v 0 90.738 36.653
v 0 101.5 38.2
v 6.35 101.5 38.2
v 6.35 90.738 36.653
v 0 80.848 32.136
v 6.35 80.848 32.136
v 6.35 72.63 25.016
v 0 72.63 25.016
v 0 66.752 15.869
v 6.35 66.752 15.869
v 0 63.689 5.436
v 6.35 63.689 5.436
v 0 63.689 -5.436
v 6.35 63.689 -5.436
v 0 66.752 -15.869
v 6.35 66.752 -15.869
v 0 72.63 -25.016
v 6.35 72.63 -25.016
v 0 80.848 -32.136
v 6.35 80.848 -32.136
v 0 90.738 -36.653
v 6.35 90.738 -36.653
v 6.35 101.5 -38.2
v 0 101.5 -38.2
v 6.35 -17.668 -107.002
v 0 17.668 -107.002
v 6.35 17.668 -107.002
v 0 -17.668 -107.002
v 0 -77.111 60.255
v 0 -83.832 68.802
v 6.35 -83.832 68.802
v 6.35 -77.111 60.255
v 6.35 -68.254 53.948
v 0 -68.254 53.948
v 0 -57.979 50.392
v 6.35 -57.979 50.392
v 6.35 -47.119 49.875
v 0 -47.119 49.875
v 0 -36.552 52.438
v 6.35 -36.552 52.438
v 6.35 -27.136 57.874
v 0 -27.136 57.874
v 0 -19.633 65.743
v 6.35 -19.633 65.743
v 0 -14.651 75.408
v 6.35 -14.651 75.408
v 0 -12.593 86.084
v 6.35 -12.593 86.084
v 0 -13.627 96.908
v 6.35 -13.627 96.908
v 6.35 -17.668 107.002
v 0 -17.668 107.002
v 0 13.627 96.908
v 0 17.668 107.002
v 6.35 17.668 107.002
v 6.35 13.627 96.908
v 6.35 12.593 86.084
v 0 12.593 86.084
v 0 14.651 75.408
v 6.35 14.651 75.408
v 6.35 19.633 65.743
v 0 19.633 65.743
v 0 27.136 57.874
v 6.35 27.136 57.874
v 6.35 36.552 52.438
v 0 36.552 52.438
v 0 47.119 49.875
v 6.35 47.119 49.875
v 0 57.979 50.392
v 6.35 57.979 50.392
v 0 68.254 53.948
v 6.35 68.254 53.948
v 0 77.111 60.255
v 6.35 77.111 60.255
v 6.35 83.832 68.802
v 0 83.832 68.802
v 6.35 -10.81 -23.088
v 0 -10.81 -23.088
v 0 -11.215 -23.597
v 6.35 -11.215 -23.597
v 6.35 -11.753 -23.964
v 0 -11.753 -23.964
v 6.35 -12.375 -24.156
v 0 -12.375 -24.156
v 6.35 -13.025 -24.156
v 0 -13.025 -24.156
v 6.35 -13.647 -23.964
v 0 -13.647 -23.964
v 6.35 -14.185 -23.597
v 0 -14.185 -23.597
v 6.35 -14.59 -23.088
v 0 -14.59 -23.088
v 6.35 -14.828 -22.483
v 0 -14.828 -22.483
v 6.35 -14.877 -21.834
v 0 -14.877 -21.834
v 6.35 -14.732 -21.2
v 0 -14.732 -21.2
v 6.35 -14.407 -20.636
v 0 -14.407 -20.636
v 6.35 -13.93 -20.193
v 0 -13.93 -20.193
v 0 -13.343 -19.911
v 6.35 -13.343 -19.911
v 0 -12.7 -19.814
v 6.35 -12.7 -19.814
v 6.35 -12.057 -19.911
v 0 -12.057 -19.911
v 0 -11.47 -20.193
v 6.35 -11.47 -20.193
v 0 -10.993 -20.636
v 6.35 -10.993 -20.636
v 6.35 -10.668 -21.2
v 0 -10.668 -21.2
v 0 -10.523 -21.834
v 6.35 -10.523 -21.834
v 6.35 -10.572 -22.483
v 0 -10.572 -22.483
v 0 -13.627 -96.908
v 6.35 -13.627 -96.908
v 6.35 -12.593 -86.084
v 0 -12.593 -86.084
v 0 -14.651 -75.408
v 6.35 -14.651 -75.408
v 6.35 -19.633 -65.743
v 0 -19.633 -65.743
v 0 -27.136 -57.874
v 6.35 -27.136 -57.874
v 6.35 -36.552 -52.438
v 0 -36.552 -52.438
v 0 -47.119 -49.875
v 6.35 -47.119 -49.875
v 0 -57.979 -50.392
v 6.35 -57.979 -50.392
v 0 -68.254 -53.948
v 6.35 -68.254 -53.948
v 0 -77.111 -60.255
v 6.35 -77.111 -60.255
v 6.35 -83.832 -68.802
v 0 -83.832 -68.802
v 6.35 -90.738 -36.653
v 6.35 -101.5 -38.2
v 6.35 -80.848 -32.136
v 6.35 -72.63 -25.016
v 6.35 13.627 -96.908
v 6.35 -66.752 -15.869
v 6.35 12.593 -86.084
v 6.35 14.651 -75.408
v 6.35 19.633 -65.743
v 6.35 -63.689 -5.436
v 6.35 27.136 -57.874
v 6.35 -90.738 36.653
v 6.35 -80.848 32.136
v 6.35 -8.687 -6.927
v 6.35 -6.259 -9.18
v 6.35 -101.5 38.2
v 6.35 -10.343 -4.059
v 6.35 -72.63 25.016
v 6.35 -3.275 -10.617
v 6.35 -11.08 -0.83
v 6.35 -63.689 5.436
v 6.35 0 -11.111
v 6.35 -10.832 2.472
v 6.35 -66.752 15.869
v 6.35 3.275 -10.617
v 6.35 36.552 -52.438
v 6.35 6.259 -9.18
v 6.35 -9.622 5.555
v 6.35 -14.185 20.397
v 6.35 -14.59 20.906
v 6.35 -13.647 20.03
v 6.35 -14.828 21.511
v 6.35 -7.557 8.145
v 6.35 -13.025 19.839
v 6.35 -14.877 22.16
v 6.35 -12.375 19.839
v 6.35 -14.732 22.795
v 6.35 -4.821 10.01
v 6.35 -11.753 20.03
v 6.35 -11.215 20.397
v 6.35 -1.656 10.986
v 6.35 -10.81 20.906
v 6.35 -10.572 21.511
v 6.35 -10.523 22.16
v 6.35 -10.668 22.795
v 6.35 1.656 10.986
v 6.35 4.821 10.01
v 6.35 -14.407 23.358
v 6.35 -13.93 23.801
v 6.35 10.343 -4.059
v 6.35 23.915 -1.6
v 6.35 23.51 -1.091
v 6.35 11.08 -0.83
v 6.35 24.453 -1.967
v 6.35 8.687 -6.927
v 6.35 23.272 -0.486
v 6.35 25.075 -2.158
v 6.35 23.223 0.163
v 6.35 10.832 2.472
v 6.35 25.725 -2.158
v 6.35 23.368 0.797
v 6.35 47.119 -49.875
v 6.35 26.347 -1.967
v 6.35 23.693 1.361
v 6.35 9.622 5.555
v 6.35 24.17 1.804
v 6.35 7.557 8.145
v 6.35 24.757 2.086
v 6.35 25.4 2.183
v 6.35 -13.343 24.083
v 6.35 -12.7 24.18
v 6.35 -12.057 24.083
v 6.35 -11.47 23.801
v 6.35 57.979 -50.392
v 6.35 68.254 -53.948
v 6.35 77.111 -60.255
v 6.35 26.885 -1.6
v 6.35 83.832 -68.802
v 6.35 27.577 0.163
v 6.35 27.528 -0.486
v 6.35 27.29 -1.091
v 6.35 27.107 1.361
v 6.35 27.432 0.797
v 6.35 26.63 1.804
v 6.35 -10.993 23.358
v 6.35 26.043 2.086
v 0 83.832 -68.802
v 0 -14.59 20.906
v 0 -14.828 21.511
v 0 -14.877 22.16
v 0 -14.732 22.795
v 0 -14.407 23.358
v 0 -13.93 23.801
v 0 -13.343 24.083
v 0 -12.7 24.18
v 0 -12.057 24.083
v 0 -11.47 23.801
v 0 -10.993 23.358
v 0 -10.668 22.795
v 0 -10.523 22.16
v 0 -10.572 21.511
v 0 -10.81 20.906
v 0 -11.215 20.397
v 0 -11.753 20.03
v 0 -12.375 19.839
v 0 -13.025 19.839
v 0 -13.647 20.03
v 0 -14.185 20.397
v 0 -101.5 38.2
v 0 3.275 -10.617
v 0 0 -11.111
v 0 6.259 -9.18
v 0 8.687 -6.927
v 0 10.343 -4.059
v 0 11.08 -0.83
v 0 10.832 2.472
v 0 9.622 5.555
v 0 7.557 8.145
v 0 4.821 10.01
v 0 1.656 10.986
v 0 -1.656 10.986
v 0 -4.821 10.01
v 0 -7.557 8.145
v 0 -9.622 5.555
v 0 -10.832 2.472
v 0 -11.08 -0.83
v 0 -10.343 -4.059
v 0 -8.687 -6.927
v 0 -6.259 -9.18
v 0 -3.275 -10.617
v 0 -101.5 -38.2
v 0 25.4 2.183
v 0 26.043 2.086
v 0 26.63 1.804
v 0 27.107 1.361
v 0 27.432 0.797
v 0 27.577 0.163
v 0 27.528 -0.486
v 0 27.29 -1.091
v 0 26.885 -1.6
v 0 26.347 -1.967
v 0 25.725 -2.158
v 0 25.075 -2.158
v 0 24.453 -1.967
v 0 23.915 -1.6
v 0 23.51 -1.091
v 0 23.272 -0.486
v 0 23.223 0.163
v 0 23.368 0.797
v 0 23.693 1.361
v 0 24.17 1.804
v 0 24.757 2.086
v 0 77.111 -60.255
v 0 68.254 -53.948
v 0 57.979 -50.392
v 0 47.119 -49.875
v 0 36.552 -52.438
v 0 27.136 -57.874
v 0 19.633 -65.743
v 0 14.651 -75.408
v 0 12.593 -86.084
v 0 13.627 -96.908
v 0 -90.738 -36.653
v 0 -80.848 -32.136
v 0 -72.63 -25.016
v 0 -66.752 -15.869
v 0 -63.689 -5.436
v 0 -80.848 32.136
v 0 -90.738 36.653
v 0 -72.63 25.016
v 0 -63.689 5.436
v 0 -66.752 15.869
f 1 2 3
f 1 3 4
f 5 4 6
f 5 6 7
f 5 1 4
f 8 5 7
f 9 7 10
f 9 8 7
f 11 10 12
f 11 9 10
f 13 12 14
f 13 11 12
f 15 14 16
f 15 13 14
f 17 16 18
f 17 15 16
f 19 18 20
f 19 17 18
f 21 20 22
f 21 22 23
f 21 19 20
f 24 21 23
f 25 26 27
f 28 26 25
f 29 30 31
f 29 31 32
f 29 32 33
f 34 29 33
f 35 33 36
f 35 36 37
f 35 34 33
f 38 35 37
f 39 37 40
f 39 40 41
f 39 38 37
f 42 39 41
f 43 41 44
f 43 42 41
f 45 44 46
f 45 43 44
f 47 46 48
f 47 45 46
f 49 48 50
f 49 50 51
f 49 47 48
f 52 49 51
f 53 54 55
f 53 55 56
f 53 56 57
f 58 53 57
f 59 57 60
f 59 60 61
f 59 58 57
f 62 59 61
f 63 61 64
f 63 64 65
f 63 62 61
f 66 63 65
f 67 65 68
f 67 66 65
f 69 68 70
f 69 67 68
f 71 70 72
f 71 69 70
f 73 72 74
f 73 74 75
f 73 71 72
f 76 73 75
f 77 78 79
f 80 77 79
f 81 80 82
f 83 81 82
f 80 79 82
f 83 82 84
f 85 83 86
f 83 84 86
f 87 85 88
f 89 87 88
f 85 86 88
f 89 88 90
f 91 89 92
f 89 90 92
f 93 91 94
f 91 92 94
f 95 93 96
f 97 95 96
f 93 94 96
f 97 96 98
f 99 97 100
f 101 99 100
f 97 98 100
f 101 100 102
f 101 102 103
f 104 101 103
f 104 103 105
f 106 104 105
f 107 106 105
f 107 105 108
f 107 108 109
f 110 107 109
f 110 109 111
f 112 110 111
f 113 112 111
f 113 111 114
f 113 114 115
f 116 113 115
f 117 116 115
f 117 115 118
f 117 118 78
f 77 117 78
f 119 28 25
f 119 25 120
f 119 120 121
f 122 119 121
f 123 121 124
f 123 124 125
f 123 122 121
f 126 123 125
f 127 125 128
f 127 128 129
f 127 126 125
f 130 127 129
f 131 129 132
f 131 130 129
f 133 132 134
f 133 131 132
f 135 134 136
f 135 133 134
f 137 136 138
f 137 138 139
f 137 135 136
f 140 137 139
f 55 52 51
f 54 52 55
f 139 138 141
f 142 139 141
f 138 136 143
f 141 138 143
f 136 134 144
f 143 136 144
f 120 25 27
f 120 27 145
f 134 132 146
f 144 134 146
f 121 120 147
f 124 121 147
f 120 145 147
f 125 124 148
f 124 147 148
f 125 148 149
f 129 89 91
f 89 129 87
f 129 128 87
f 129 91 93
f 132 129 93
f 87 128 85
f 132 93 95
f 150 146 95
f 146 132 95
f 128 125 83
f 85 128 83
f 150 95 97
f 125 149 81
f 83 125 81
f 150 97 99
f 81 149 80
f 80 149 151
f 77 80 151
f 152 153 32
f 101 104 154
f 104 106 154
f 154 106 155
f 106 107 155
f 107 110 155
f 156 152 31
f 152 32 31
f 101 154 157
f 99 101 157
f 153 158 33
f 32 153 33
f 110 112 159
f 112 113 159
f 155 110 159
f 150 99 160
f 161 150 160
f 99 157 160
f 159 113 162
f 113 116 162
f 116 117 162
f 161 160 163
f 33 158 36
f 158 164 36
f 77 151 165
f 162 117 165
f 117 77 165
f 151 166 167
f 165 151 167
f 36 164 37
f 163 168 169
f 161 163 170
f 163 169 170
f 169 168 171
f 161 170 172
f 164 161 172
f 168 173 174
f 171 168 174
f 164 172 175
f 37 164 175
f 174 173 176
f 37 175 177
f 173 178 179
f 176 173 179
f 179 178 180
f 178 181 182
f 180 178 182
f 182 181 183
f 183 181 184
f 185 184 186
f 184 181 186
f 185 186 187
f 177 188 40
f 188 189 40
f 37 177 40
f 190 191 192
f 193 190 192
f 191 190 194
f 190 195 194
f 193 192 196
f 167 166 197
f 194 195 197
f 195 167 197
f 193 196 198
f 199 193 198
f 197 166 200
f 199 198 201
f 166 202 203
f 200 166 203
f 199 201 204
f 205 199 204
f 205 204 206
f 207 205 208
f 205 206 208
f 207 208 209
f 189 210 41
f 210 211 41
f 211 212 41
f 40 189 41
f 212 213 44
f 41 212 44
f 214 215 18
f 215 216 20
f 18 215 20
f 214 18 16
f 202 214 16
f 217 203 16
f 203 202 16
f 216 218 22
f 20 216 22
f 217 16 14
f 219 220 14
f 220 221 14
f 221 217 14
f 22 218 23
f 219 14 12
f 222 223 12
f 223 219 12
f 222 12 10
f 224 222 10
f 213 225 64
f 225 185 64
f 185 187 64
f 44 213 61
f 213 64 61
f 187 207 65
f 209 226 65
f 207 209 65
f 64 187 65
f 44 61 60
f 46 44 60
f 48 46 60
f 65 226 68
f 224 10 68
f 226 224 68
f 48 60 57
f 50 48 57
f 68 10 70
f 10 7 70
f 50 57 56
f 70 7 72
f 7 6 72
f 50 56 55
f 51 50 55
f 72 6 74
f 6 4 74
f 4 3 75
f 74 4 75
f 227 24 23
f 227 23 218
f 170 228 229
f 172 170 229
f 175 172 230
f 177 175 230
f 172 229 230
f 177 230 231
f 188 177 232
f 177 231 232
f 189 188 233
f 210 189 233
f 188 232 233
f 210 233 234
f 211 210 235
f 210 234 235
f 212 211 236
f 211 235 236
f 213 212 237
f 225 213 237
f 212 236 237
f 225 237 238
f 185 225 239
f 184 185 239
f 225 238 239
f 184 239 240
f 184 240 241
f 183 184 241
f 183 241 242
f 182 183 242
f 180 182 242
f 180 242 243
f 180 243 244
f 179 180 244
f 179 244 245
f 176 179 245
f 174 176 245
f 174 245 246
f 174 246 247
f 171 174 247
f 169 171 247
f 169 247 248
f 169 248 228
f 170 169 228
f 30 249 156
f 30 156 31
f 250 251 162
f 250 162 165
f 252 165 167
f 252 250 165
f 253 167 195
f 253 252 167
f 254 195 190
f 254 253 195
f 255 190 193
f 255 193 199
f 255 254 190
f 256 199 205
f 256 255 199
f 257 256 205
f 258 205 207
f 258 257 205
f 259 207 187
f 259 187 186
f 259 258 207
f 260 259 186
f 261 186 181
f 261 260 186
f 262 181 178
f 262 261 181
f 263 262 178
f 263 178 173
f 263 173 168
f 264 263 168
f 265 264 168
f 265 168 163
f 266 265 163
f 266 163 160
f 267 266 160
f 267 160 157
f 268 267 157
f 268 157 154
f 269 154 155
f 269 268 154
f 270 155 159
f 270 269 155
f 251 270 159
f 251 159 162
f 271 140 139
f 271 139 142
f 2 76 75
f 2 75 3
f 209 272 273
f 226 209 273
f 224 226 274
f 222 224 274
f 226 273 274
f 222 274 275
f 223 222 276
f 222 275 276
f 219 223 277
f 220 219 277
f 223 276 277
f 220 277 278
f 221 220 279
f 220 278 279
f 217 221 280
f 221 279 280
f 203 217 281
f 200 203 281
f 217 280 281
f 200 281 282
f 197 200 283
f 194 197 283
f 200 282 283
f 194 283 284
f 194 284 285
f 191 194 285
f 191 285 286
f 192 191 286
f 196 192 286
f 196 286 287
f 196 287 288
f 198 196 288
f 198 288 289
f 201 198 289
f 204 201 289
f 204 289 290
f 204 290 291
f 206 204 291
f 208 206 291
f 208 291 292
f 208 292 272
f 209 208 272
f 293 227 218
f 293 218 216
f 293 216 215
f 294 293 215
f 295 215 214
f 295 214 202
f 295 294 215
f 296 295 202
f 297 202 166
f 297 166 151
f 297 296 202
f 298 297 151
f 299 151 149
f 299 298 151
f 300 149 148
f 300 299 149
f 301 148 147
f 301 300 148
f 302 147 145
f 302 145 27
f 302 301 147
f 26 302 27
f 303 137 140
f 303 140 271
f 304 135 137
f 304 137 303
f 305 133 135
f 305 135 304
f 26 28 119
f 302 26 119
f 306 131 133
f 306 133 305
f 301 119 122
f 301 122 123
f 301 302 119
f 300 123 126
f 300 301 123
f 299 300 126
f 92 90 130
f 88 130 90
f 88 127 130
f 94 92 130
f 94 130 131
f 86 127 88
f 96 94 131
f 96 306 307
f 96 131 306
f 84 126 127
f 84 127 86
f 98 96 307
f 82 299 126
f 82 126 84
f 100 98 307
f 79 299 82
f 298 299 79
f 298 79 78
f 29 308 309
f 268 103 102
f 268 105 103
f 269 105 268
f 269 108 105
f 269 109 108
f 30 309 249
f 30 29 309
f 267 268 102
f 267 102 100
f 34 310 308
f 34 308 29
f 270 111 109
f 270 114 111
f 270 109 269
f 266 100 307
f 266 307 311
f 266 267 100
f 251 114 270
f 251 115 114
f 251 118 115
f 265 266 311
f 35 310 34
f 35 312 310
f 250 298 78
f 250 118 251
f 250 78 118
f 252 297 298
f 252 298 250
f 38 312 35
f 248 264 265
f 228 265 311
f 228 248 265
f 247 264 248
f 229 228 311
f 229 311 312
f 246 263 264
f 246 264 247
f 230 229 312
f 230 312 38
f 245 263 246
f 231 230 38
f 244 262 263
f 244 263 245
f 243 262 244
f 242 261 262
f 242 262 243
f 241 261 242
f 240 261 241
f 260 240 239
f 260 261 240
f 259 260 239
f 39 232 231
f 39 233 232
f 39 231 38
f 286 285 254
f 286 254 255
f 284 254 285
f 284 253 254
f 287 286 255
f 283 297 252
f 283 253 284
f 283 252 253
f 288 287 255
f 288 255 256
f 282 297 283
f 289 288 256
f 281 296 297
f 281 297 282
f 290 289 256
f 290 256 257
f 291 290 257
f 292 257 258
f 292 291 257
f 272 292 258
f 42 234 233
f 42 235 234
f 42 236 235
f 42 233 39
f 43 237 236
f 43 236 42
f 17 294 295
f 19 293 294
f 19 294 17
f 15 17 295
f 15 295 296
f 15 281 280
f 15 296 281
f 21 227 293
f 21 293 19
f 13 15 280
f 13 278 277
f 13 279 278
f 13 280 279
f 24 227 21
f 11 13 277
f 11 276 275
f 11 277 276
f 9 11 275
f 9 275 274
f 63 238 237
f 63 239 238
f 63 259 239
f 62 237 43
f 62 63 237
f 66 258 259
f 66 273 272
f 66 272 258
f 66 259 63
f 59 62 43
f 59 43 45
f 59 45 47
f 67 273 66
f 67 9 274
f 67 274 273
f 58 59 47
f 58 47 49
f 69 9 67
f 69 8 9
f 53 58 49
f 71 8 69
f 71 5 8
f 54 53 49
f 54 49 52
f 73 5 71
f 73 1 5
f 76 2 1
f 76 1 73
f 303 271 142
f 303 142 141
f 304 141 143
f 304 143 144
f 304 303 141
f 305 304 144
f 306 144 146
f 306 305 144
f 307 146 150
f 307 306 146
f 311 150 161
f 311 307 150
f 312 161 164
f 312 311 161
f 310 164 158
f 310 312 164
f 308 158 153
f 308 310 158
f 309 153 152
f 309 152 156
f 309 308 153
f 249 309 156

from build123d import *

# Parameters (mm, degrees)
SKETCH1_R                        = 11.110595
BOSS_EXTRUDE1_DEPTH              = 6.35
F_11_64_0_17188_DIAMETER_HOLE1_D = 4.365752
CIRPATTERN1_COUNT                = 3


with BuildPart() as part:
    # Sketch1 → Boss-Extrude1 (new body)
    with BuildSketch(Plane(origin=(0, 0, 0), x_dir=(0, 0, -1), z_dir=(1, 0, 0))):
        with BuildLine():
            Line((38.200000054, 101.5), (68.801578457, 83.832170471))
            ThreePointArc((68.801578457, 83.832170471), (54.819408013, 31.649999973), (107.001578511, 17.667829529))
            Line((107.001578511, 17.667829529), (107.001578511, -17.667829529))
            ThreePointArc((107.001578511, -17.667829529), (54.819408013, -31.649999973), (68.801578457, -83.832170471))
            Line((68.801578457, -83.832170471), (38.200000054, -101.5))
            ThreePointArc((38.200000054, -101.5), (0, -63.299999946), (-38.200000054, -101.5))
            Line((-38.200000054, -101.5), (-68.801578457, -83.832170471))
            ThreePointArc((-68.801578457, -83.832170471), (-54.819408013, -31.649999973), (-107.001578511, -17.667829529))
            Line((-107.001578511, -17.667829529), (-107.001578511, 17.667829529))
            ThreePointArc((-107.001578511, 17.667829529), (-54.819408013, 31.649999973), (-68.801578457, 83.832170471))
            Line((-68.801578457, 83.832170471), (-38.200000054, 101.5))
            ThreePointArc((-38.200000054, 101.5), (0, 63.299999946), (38.200000054, 101.5))
        make_face()
        Circle(SKETCH1_R, mode=Mode.SUBTRACT)
    extrude(amount=BOSS_EXTRUDE1_DEPTH)

    # 11/64 (0.17188) Diameter Hole1 (through all)
    with Locations(Plane(origin=(6.35, 0, 0), x_dir=(0, 0, -1), z_dir=(1, 0, 0))):
        with Locations((0, 25.4)):
            f_11_64_0_17188_diameter_hole1 = Hole(F_11_64_0_17188_DIAMETER_HOLE1_D / 2)

    # CirPattern1: 11/64 (0.17188) Diameter Hole1 ×3 about axis
    cirpattern1_axis = Axis((0, 0, 0), (1, 0, 0))
    for i in range(1, CIRPATTERN1_COUNT):
        add(f_11_64_0_17188_diameter_hole1.rotate(cirpattern1_axis, i * 360 / CIRPATTERN1_COUNT), mode=Mode.SUBTRACT)


solid = part.part
